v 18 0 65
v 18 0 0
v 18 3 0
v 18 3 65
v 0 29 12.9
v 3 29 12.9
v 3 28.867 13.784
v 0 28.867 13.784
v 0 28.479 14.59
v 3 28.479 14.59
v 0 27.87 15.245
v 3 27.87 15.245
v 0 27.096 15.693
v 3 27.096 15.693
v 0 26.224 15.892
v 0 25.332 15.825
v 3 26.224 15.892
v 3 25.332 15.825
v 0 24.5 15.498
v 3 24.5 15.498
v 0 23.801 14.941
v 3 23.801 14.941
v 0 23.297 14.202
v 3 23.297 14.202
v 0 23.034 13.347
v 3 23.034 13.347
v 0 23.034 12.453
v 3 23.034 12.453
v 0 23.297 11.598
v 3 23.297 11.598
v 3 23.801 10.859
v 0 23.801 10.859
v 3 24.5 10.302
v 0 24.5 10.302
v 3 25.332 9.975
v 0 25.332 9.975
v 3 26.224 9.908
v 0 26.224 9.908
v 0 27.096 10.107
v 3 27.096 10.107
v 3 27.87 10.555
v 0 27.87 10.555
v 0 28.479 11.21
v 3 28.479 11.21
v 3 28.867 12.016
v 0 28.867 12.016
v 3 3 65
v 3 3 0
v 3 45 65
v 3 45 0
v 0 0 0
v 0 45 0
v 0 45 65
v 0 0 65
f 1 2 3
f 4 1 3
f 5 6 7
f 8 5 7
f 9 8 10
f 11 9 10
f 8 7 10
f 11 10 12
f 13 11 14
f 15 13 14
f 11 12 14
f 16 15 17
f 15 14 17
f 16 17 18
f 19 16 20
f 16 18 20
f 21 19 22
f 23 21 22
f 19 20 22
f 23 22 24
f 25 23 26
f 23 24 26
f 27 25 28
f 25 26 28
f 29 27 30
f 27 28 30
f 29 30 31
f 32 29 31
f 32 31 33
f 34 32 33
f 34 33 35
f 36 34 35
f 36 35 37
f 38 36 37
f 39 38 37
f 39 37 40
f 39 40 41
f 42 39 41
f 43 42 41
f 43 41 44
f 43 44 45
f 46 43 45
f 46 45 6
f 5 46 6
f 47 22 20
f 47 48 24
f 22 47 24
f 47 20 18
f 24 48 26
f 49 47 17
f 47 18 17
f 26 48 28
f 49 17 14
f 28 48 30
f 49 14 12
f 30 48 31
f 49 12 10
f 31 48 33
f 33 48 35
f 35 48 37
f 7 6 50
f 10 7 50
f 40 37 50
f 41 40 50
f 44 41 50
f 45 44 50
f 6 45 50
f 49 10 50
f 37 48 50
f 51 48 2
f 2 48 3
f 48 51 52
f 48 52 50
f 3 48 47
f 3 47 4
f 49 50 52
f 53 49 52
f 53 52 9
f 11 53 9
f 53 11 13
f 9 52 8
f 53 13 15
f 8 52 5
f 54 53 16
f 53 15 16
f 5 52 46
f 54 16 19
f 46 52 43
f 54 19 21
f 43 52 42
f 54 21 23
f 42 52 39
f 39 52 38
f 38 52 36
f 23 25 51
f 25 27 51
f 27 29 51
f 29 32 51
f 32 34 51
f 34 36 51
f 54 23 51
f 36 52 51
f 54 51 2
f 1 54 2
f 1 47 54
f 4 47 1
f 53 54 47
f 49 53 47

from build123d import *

# Parameters (mm, degrees)
SKETCH_1_W          = 15
SKETCH_1_H          = 3
EXTRUDE_1_DEPTH     = 65
SKETCH_2_R          = 3
CUT_EXTRUDE_1_DEPTH = 64.5


with BuildPart() as part:
    # 草图1 → 凸台-拉伸1 (new body)
    with BuildSketch(Plane.XY):
        Polygon((3, 45), (0, 45), (0, 0), (3, 0), (3, 3), align=None)
        with Locations((10.5, 1.5)):
            Rectangle(SKETCH_1_W, SKETCH_1_H)
    extrude(amount=EXTRUDE_1_DEPTH)

    # 草图2 → 切除-拉伸1 (cut)
    with BuildSketch(Plane(origin=(3, 0, 0), x_dir=(0, 0, -1), z_dir=(1, 0, 0))):
        with Locations(Location((-12.9, 26, 0), (0, 0, 90))):
            Circle(SKETCH_2_R)
    extrude(amount=-CUT_EXTRUDE_1_DEPTH, mode=Mode.SUBTRACT)


solid = part.part
